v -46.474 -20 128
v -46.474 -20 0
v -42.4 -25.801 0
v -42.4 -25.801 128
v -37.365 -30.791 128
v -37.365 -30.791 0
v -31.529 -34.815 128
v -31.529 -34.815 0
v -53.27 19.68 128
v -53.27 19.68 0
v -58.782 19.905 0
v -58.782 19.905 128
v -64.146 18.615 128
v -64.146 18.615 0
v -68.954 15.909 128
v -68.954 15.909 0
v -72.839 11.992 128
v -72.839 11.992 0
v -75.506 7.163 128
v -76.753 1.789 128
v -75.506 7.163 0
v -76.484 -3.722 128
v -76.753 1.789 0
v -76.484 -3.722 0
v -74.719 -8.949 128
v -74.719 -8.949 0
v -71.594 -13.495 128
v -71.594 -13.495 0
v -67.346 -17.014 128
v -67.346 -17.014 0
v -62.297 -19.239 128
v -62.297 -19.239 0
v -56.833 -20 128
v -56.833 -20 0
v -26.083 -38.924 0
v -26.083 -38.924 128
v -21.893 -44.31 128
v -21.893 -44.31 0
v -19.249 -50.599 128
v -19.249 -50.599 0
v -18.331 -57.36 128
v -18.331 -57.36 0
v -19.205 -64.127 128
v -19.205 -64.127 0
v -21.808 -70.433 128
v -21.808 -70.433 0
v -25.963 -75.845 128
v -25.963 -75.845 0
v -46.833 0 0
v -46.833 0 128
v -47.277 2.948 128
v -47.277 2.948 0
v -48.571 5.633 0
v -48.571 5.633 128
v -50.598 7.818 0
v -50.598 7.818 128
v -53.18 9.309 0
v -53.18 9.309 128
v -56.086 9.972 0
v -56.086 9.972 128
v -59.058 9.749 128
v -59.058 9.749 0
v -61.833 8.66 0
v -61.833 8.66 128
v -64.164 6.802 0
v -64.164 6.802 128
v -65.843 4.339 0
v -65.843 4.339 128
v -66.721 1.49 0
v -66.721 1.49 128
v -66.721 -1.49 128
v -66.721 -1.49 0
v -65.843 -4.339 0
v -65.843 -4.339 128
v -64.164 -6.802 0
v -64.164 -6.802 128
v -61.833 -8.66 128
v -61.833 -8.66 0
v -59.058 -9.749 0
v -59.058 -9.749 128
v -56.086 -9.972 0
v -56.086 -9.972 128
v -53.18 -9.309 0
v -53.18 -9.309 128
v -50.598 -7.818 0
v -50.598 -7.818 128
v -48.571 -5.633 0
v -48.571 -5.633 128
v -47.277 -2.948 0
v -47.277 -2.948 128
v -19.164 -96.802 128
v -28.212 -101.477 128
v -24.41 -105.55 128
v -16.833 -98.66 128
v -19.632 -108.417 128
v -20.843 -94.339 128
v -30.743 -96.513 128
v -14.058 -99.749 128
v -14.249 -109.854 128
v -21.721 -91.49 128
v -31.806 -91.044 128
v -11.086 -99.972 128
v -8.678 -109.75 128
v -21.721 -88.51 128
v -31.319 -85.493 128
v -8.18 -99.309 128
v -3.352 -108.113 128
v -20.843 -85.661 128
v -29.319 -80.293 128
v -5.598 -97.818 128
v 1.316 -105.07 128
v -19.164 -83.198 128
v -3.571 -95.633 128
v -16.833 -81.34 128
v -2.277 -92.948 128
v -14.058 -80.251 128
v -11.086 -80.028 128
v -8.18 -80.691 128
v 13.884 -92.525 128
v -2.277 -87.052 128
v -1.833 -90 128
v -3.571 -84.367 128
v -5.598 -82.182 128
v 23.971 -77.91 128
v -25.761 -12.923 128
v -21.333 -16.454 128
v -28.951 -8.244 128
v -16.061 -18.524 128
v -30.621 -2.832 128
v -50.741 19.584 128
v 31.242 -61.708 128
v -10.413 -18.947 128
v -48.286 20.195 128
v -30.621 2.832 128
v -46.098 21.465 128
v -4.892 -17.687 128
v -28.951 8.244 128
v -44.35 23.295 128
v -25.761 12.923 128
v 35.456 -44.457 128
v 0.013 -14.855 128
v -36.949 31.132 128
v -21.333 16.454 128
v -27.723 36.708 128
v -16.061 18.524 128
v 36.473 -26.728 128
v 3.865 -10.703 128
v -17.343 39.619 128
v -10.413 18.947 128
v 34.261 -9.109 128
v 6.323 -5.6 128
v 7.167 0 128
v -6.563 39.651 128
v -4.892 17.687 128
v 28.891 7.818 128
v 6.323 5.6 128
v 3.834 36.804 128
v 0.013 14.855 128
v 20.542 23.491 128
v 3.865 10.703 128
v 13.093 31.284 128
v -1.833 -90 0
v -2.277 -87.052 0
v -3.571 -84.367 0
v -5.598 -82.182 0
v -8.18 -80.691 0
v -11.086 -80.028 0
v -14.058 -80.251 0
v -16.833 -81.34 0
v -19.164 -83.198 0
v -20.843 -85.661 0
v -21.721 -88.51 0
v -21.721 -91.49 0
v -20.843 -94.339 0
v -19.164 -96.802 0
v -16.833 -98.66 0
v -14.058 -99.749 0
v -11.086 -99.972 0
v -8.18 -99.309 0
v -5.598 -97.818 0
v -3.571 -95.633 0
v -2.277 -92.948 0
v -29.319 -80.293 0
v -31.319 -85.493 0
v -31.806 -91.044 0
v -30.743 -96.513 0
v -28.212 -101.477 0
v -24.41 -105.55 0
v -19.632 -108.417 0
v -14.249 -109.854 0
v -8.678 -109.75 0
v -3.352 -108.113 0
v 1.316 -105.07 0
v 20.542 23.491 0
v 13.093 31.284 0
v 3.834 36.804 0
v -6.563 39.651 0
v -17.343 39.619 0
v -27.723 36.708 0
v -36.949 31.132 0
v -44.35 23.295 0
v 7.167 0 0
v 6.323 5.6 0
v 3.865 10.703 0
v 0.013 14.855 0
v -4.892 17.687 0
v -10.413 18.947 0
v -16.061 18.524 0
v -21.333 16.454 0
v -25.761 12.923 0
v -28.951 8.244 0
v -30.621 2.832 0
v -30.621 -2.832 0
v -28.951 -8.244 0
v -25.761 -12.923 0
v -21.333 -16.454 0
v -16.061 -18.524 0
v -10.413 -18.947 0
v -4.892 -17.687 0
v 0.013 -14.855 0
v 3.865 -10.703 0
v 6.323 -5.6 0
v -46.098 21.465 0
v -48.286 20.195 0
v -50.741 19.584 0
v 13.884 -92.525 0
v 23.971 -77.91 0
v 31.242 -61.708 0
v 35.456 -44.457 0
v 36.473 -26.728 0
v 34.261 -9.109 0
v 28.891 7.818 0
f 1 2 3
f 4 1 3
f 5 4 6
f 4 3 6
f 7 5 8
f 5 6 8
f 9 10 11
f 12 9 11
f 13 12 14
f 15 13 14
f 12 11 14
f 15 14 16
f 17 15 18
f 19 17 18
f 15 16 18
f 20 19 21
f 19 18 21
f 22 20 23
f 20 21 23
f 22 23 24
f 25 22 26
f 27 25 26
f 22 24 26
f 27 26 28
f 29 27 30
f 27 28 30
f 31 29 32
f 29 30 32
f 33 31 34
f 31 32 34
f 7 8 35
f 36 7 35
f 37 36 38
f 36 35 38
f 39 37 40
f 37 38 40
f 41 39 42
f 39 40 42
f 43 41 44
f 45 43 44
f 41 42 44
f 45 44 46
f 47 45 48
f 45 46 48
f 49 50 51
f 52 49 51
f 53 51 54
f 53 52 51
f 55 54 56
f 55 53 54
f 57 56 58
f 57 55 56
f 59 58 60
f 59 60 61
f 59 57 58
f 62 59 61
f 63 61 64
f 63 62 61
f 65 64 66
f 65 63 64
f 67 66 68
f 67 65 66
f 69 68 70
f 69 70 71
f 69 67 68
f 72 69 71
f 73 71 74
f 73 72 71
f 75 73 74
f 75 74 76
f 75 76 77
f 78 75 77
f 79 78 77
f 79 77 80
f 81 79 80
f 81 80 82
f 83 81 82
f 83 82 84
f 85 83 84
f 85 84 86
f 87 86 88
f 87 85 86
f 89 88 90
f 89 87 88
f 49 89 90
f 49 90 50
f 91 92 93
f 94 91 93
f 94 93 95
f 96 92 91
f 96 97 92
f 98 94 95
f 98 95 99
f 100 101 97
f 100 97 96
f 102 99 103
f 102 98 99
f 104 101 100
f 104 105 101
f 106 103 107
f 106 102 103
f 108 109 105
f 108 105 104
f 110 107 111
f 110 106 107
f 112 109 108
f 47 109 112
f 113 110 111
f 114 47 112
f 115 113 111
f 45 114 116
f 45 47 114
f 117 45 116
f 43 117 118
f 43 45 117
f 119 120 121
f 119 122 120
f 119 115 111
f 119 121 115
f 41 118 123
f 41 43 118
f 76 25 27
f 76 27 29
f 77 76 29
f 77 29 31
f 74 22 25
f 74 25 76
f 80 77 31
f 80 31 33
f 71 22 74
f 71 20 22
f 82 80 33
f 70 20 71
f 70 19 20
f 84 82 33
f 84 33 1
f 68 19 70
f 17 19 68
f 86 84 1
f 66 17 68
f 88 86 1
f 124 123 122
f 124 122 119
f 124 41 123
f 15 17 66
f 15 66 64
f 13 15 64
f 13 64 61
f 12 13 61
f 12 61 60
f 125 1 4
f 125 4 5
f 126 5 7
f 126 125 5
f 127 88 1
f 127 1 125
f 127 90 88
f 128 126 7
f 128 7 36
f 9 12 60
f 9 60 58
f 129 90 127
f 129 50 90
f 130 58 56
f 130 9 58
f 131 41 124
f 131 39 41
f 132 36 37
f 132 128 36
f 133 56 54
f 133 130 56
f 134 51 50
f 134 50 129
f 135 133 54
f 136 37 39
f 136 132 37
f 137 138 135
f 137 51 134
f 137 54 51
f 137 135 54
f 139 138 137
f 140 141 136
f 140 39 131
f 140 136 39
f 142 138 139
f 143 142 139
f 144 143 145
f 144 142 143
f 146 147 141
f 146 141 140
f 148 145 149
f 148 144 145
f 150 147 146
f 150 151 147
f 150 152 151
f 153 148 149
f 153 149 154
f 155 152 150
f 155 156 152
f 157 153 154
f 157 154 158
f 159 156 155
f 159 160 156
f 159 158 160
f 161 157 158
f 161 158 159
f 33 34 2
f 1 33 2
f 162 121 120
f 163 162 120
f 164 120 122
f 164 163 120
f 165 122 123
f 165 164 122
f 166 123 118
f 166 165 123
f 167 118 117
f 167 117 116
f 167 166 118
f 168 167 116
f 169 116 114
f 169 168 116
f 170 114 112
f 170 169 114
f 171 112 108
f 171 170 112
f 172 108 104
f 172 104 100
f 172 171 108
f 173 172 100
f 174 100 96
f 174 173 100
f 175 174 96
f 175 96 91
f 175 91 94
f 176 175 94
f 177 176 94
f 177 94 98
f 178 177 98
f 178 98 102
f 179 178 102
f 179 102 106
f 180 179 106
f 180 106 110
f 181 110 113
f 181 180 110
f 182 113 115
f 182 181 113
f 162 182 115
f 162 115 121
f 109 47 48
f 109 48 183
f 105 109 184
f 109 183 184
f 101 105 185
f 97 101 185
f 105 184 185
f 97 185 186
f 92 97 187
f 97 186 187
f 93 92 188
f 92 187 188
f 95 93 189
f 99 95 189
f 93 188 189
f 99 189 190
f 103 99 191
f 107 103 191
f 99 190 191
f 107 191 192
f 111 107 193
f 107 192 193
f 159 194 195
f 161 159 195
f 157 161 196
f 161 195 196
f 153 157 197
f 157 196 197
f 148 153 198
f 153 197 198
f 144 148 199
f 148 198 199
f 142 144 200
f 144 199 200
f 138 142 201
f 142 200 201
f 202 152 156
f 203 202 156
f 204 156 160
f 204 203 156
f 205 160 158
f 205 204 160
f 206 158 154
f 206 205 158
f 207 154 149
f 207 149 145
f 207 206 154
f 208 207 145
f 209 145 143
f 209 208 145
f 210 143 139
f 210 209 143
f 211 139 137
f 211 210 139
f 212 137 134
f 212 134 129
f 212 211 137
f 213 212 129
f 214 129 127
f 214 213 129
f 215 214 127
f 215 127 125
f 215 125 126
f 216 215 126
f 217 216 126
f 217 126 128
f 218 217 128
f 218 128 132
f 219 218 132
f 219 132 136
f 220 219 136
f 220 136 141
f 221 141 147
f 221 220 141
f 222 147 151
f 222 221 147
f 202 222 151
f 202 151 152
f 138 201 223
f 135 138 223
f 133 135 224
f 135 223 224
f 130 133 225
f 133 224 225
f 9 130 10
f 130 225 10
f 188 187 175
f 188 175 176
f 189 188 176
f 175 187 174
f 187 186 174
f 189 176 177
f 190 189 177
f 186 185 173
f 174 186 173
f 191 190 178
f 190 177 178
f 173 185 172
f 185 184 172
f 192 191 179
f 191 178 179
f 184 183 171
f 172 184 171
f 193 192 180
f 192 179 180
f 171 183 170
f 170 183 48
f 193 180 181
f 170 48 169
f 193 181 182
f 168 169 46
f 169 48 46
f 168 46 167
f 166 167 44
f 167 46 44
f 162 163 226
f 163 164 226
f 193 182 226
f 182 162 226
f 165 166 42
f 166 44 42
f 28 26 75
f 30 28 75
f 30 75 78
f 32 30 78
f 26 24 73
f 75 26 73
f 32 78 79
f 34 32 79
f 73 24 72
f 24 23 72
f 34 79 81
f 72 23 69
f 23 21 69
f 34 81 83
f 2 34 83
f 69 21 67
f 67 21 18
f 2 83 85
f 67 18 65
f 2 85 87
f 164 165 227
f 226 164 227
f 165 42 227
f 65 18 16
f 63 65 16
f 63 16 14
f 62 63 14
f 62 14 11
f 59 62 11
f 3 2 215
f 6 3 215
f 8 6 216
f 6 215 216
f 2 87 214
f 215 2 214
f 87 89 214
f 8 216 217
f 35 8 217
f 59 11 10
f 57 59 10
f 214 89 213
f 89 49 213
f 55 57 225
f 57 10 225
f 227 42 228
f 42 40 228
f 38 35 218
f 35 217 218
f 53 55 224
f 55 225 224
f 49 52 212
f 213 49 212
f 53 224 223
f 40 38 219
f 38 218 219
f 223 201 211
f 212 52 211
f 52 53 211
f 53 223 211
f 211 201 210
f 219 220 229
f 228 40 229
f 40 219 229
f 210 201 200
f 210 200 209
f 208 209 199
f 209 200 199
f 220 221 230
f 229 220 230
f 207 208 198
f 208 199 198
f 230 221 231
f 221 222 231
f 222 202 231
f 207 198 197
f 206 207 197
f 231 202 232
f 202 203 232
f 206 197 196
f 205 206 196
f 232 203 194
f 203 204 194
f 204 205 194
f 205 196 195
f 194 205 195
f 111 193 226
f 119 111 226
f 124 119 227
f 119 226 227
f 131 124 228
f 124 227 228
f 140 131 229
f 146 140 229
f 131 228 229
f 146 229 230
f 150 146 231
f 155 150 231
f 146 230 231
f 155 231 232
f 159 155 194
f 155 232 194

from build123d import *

# Parameters (mm, degrees)
SKETCH1_R           = 10
SKETCH1_R_2         = 19
BOSS_EXTRUDE1_DEPTH = 128


with BuildPart() as part:
    # Sketch1 → Boss-Extrude1 (new body)
    with BuildSketch(Plane.XY):
        with BuildLine():
            ThreePointArc((20.542128414, 23.491399981), (-11.954310602, 39.999816289), (-44.350086912, 23.294726197))
            ThreePointArc((-44.350086912, 23.294726197), (-48.286212782, 20.194921951), (-53.269861719, 19.680027304))
            ThreePointArc((-53.269861719, 19.680027304), (-76.75292632, 1.788778062), (-56.833080109, -20))
            Line((-56.833080109, -20), (-46.474096261, -20))
            ThreePointArc((-46.474096261, -20), (-39.993245797, -28.407834632), (-31.528984999, -34.814814815))
            ThreePointArc((-31.528984999, -34.814814815), (-18.567319972, -53.9492851), (-25.962751008, -75.845410628))
            ThreePointArc((-25.962751008, -75.845410628), (-26.45371097, -103.646873387), (1.315633204, -105.070213608))
            ThreePointArc((1.315633204, -105.070213608), (35.455910615, -44.457444325), (20.542128414, 23.491399981))
        make_face()
        with Locations((-56.833080109, 0)):
            Circle(SKETCH1_R, mode=Mode.SUBTRACT)
        with Locations((-11.833080109, -90)):
            Circle(SKETCH1_R, mode=Mode.SUBTRACT)
        with Locations((-11.833080109, 0)):
            Circle(SKETCH1_R_2, mode=Mode.SUBTRACT)
    extrude(amount=BOSS_EXTRUDE1_DEPTH)


solid = part.part
